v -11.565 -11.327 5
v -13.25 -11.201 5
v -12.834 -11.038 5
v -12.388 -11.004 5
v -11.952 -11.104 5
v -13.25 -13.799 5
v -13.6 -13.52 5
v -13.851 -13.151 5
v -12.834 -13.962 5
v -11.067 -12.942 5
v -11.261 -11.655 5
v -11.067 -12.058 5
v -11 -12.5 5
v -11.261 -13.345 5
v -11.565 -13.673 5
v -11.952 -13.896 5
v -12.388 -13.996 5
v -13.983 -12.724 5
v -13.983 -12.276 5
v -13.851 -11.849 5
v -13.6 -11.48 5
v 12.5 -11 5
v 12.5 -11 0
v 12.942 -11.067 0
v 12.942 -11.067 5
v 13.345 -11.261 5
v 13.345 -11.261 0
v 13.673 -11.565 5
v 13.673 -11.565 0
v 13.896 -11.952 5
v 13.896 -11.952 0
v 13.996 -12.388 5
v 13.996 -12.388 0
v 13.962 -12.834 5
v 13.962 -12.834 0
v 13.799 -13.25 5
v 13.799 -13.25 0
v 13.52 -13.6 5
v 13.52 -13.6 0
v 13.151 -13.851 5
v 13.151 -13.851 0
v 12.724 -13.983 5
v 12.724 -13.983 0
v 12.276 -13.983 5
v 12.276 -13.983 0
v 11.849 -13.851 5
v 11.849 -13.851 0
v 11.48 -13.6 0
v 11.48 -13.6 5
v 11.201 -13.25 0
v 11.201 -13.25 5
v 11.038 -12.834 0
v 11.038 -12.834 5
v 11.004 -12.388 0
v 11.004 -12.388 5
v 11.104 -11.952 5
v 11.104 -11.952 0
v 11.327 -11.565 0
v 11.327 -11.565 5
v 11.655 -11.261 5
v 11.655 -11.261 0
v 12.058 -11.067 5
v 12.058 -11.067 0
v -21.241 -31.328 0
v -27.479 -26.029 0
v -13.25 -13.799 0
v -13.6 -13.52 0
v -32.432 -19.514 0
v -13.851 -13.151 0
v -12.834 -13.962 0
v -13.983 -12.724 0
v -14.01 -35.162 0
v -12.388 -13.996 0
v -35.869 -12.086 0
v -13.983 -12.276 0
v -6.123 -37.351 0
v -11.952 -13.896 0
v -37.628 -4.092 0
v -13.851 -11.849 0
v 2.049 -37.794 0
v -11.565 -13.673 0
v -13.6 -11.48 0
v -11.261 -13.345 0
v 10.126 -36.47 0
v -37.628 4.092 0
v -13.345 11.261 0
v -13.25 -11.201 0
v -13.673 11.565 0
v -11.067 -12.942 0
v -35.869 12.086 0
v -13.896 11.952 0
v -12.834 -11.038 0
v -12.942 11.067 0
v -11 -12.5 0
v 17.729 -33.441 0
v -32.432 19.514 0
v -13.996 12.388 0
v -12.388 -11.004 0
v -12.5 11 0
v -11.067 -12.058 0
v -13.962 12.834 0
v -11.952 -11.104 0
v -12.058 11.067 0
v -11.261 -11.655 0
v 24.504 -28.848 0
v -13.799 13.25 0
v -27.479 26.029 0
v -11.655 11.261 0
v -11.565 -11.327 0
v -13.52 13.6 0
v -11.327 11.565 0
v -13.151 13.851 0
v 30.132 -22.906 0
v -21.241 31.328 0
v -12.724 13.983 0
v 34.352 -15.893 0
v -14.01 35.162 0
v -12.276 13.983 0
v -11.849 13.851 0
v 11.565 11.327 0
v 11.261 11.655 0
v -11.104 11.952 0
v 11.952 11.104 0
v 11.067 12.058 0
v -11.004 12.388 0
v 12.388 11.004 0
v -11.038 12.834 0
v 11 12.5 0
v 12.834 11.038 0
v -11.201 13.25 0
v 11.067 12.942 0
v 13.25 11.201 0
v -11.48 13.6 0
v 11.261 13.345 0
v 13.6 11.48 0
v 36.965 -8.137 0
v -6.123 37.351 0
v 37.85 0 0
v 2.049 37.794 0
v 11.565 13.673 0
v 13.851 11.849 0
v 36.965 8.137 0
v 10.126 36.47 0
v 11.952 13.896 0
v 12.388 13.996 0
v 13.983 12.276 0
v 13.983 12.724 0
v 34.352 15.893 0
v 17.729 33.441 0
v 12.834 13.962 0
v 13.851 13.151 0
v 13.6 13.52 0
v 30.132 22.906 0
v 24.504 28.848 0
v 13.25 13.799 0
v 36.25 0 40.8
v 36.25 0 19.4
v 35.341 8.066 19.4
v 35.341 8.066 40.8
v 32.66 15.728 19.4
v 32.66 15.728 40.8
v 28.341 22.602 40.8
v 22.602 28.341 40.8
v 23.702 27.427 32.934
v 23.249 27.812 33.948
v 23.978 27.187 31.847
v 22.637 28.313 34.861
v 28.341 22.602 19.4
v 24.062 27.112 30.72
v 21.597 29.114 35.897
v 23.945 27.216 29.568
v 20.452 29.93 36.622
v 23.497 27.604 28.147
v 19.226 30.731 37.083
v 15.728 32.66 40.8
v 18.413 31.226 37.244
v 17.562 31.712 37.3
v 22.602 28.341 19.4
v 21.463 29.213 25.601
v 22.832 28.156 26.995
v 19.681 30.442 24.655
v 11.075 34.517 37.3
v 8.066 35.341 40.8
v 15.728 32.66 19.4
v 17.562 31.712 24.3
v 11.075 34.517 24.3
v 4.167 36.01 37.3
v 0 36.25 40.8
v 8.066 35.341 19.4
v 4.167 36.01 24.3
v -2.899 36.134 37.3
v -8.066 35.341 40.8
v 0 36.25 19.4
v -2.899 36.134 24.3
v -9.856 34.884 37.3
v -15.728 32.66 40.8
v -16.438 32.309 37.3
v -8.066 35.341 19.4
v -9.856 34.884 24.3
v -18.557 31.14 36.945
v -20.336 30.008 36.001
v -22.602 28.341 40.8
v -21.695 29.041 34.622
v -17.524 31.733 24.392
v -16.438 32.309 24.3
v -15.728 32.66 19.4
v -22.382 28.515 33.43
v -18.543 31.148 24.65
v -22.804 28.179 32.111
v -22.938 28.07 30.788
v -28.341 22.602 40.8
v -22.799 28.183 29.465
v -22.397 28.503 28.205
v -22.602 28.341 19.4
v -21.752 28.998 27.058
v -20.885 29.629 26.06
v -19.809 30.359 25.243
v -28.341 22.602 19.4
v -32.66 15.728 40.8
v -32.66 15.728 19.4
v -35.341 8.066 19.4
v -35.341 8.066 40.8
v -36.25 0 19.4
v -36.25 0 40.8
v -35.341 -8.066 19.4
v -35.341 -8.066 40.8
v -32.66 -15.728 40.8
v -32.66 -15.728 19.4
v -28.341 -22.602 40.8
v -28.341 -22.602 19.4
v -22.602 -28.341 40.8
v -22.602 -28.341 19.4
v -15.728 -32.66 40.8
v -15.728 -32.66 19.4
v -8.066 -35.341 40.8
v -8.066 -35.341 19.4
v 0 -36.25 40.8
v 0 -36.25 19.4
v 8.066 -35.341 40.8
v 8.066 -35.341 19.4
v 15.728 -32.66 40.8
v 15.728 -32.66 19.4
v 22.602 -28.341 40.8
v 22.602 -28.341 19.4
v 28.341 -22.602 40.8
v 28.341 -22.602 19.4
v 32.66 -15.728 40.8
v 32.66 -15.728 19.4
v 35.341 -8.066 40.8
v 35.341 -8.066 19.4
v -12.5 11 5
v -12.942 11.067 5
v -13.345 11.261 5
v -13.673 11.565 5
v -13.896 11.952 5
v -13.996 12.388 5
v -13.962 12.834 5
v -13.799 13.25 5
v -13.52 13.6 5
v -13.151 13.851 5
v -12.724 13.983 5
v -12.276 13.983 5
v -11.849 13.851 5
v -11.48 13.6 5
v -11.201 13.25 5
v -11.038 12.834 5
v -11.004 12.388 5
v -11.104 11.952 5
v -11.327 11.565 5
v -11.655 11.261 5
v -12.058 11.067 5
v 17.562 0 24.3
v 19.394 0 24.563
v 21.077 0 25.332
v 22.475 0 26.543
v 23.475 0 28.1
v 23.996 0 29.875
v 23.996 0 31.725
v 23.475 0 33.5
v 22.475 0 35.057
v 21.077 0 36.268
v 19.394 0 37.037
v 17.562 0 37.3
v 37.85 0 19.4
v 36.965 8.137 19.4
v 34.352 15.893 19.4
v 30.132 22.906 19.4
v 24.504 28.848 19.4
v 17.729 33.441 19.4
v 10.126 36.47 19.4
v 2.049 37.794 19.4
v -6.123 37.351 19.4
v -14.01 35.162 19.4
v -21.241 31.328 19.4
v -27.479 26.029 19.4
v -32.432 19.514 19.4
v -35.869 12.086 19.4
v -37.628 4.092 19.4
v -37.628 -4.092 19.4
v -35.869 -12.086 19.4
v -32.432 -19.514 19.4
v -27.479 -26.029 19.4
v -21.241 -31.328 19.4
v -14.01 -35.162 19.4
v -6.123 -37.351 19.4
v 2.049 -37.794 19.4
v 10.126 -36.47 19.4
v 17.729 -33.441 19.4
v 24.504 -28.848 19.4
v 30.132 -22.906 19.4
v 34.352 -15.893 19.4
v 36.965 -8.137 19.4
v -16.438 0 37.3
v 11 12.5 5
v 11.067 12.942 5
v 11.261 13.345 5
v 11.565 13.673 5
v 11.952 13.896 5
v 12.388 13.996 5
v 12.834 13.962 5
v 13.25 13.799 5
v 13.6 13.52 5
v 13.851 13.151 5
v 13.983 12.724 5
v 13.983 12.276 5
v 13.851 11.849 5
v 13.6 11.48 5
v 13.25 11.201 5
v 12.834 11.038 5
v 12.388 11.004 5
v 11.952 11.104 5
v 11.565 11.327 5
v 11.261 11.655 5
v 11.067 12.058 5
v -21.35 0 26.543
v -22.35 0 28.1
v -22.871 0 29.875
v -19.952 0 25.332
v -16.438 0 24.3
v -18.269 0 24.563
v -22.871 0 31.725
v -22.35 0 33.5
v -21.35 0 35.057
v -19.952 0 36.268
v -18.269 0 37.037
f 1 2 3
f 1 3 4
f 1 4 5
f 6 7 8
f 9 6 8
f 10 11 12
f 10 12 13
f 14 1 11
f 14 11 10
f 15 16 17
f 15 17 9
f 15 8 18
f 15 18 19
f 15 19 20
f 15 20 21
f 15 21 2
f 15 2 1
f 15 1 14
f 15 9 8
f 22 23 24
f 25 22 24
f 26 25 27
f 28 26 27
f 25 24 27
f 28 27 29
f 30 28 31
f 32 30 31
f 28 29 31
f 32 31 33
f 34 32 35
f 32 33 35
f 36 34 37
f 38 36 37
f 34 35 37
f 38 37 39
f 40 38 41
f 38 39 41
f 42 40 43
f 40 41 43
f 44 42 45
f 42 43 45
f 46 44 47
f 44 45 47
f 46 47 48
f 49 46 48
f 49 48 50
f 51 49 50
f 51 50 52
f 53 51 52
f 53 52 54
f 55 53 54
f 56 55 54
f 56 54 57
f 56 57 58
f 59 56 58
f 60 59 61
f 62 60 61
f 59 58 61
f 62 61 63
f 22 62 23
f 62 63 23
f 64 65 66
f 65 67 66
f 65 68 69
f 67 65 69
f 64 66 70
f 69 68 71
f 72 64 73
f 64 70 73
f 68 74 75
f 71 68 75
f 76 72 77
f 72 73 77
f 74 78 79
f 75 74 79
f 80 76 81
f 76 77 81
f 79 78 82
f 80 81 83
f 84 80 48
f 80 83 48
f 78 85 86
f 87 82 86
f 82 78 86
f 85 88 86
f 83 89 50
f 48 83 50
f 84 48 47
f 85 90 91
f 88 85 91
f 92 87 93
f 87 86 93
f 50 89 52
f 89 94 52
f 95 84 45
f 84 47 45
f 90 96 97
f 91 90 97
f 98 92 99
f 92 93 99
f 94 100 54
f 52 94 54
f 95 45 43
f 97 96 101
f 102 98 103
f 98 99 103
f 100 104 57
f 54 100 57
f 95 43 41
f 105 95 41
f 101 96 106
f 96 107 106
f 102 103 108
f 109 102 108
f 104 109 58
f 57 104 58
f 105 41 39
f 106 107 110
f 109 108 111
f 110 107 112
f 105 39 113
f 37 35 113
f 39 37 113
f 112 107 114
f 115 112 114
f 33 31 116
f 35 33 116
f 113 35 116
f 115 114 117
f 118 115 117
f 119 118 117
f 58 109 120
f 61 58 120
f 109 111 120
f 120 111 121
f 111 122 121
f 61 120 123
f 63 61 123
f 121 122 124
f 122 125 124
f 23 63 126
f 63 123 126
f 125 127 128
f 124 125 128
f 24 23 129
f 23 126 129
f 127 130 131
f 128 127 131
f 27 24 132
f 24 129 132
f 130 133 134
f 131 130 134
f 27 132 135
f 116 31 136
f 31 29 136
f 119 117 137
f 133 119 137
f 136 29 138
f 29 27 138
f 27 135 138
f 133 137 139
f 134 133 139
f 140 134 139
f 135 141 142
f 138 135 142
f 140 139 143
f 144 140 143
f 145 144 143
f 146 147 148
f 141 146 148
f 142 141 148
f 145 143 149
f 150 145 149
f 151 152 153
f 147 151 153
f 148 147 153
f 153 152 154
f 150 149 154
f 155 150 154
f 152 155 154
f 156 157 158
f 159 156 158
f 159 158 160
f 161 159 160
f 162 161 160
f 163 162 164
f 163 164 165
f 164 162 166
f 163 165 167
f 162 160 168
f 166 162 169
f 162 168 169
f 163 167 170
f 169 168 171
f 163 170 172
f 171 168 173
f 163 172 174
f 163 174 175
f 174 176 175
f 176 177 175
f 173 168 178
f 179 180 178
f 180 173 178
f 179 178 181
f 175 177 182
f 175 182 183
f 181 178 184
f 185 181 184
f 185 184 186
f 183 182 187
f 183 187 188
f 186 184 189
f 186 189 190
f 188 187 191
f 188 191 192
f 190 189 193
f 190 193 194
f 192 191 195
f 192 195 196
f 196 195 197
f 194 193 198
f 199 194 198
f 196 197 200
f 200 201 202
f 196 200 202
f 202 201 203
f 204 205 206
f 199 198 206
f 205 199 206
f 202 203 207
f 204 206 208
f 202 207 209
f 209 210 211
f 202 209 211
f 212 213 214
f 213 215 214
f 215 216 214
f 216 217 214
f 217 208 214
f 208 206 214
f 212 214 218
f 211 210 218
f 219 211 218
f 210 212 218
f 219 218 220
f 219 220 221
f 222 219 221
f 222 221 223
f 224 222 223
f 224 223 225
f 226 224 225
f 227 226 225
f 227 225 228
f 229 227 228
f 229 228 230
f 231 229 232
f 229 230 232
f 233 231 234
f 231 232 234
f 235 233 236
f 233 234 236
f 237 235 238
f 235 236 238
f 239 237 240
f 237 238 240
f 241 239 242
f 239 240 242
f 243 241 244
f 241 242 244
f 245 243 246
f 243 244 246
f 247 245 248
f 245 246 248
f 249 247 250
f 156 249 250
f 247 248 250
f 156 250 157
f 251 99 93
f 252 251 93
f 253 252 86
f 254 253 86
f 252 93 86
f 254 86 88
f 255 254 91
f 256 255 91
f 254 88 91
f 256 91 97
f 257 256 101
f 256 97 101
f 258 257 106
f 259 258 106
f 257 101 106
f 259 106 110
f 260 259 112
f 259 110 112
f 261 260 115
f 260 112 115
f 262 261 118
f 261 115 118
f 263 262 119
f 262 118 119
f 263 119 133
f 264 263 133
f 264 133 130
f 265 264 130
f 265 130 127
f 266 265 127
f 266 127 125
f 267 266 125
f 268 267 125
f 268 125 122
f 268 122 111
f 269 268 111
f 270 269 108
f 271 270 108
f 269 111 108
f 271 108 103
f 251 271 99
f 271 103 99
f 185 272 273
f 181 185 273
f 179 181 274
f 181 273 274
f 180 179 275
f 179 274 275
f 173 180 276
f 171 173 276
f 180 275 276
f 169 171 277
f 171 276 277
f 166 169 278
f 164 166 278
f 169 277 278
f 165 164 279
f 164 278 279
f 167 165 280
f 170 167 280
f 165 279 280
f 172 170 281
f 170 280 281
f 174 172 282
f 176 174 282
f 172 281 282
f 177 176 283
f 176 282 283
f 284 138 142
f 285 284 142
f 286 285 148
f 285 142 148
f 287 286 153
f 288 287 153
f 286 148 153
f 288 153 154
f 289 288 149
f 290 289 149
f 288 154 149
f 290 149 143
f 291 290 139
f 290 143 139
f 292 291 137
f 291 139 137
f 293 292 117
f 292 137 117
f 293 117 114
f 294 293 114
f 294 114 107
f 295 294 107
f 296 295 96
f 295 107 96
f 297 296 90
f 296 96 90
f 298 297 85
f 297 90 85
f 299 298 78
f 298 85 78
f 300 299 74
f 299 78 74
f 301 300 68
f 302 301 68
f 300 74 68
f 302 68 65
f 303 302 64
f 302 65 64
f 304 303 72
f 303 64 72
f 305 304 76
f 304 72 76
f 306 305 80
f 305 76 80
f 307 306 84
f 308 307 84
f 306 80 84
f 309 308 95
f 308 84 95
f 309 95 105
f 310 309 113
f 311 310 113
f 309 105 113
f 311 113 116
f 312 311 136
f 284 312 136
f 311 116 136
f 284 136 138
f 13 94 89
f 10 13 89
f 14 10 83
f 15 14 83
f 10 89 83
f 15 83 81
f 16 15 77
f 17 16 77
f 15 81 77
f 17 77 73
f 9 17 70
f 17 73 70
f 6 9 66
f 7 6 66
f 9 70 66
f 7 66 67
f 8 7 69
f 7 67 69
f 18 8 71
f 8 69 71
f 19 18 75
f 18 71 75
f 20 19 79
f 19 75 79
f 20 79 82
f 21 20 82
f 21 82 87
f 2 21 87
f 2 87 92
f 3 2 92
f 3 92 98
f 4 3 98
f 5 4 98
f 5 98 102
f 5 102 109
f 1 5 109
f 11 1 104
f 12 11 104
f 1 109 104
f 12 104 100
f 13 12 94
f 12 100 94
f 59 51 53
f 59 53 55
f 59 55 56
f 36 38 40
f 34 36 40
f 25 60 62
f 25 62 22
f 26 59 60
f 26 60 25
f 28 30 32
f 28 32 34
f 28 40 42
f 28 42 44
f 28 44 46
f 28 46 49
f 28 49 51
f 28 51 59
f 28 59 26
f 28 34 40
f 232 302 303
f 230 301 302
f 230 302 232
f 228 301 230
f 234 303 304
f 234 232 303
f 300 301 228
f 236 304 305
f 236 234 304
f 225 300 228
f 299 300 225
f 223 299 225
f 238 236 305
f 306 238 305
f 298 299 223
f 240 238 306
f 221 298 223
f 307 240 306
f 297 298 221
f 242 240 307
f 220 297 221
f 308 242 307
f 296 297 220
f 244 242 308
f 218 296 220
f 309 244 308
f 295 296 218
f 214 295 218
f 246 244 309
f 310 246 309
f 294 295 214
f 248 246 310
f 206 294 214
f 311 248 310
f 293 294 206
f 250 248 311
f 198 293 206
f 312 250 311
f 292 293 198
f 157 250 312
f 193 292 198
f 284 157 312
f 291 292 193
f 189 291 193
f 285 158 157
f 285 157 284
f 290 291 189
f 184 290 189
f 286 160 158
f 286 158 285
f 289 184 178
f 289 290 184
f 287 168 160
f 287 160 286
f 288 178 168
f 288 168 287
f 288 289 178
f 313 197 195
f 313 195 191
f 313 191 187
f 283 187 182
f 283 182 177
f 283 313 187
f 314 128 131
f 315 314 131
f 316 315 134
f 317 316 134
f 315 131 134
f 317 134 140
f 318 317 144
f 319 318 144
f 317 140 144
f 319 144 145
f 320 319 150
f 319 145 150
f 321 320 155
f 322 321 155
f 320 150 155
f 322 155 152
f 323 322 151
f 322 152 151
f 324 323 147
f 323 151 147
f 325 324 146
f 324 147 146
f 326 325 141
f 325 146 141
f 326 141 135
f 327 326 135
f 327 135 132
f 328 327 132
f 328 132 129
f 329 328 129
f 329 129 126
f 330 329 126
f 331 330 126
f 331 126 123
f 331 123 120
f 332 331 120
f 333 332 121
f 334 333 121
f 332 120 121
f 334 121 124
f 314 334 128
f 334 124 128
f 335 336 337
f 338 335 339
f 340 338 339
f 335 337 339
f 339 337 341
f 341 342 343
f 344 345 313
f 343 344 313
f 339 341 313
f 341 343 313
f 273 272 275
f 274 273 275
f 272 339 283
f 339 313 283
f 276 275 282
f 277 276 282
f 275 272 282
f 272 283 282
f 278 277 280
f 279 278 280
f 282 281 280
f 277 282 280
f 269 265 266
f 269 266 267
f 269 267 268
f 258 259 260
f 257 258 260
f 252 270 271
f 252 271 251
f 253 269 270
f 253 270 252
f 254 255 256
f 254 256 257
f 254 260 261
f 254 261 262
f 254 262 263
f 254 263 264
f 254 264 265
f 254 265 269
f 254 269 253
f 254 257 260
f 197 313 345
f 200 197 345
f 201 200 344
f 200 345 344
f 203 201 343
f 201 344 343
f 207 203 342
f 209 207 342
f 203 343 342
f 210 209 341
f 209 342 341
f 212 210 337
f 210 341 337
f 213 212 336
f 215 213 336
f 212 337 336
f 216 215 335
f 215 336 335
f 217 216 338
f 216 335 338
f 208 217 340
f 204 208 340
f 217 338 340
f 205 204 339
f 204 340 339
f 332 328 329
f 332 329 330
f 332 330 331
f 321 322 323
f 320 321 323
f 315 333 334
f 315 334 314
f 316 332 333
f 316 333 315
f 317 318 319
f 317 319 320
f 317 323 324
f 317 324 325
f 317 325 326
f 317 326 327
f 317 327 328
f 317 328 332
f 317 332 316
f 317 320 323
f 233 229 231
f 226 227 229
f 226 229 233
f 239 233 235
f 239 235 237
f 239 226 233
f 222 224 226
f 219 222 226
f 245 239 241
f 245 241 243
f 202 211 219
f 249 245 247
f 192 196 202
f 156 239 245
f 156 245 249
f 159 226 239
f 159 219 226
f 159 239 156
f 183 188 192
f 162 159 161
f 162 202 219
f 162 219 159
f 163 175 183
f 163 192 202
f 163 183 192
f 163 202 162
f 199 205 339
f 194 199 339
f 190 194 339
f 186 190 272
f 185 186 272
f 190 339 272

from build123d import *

# Parameters (mm, degrees)
SKETCH_R           = 37.85
PAD_DEPTH          = 19.4
SKETCH001_R        = 36.25
PAD001_DEPTH       = 21.4
POCKET_DEPTH       = 50
SKETCH003_R        = 1.5
POCKET001_DEPTH    = 5
POLARPATTERN_COUNT = 4


with BuildPart() as part:
    # Sketch → Pad (new body)
    with BuildSketch(Plane.XY):
        Circle(SKETCH_R)
    extrude(amount=PAD_DEPTH)

    # Sketch001 (on Face3 of Pad) → Pad001 (join)
    with BuildSketch(Plane.XY.offset(19.4)):
        Circle(SKETCH001_R)
    extrude(amount=PAD001_DEPTH)

    # Sketch002 → Pocket (cut)
    with BuildSketch(Plane.XZ):
        with BuildLine():
            ThreePointArc((-16.437559, 37.3), (-22.937559, 30.8), (-16.437559, 24.3))
            Line((-16.437559, 24.3), (17.562441, 24.3))
            ThreePointArc((17.562441, 24.3), (24.062441, 30.8), (17.562441, 37.3))
            Line((-16.437559, 37.3), (17.562441, 37.3))
        make_face()
    extrude(amount=-POCKET_DEPTH, mode=Mode.SUBTRACT)

    # Sketch003 (on Face2 of Pocket) → Pocket001 (cut)
    with BuildSketch(Plane(origin=(0, 0, 0), x_dir=(1, 0, 0), z_dir=(0, 0, -1))):
        with Locations((-12.5, 12.5)):
            Circle(SKETCH003_R)
    pocket001 = extrude(amount=-POCKET001_DEPTH, mode=Mode.SUBTRACT)

    # PolarPattern: Pocket001 ×4 about axis
    polarpattern_axis = Axis((0, 0, 0), (0, 0, -1))
    for i in range(1, POLARPATTERN_COUNT):
        add(pocket001.rotate(polarpattern_axis, i * 360 / POLARPATTERN_COUNT), mode=Mode.SUBTRACT)


solid = part.part
